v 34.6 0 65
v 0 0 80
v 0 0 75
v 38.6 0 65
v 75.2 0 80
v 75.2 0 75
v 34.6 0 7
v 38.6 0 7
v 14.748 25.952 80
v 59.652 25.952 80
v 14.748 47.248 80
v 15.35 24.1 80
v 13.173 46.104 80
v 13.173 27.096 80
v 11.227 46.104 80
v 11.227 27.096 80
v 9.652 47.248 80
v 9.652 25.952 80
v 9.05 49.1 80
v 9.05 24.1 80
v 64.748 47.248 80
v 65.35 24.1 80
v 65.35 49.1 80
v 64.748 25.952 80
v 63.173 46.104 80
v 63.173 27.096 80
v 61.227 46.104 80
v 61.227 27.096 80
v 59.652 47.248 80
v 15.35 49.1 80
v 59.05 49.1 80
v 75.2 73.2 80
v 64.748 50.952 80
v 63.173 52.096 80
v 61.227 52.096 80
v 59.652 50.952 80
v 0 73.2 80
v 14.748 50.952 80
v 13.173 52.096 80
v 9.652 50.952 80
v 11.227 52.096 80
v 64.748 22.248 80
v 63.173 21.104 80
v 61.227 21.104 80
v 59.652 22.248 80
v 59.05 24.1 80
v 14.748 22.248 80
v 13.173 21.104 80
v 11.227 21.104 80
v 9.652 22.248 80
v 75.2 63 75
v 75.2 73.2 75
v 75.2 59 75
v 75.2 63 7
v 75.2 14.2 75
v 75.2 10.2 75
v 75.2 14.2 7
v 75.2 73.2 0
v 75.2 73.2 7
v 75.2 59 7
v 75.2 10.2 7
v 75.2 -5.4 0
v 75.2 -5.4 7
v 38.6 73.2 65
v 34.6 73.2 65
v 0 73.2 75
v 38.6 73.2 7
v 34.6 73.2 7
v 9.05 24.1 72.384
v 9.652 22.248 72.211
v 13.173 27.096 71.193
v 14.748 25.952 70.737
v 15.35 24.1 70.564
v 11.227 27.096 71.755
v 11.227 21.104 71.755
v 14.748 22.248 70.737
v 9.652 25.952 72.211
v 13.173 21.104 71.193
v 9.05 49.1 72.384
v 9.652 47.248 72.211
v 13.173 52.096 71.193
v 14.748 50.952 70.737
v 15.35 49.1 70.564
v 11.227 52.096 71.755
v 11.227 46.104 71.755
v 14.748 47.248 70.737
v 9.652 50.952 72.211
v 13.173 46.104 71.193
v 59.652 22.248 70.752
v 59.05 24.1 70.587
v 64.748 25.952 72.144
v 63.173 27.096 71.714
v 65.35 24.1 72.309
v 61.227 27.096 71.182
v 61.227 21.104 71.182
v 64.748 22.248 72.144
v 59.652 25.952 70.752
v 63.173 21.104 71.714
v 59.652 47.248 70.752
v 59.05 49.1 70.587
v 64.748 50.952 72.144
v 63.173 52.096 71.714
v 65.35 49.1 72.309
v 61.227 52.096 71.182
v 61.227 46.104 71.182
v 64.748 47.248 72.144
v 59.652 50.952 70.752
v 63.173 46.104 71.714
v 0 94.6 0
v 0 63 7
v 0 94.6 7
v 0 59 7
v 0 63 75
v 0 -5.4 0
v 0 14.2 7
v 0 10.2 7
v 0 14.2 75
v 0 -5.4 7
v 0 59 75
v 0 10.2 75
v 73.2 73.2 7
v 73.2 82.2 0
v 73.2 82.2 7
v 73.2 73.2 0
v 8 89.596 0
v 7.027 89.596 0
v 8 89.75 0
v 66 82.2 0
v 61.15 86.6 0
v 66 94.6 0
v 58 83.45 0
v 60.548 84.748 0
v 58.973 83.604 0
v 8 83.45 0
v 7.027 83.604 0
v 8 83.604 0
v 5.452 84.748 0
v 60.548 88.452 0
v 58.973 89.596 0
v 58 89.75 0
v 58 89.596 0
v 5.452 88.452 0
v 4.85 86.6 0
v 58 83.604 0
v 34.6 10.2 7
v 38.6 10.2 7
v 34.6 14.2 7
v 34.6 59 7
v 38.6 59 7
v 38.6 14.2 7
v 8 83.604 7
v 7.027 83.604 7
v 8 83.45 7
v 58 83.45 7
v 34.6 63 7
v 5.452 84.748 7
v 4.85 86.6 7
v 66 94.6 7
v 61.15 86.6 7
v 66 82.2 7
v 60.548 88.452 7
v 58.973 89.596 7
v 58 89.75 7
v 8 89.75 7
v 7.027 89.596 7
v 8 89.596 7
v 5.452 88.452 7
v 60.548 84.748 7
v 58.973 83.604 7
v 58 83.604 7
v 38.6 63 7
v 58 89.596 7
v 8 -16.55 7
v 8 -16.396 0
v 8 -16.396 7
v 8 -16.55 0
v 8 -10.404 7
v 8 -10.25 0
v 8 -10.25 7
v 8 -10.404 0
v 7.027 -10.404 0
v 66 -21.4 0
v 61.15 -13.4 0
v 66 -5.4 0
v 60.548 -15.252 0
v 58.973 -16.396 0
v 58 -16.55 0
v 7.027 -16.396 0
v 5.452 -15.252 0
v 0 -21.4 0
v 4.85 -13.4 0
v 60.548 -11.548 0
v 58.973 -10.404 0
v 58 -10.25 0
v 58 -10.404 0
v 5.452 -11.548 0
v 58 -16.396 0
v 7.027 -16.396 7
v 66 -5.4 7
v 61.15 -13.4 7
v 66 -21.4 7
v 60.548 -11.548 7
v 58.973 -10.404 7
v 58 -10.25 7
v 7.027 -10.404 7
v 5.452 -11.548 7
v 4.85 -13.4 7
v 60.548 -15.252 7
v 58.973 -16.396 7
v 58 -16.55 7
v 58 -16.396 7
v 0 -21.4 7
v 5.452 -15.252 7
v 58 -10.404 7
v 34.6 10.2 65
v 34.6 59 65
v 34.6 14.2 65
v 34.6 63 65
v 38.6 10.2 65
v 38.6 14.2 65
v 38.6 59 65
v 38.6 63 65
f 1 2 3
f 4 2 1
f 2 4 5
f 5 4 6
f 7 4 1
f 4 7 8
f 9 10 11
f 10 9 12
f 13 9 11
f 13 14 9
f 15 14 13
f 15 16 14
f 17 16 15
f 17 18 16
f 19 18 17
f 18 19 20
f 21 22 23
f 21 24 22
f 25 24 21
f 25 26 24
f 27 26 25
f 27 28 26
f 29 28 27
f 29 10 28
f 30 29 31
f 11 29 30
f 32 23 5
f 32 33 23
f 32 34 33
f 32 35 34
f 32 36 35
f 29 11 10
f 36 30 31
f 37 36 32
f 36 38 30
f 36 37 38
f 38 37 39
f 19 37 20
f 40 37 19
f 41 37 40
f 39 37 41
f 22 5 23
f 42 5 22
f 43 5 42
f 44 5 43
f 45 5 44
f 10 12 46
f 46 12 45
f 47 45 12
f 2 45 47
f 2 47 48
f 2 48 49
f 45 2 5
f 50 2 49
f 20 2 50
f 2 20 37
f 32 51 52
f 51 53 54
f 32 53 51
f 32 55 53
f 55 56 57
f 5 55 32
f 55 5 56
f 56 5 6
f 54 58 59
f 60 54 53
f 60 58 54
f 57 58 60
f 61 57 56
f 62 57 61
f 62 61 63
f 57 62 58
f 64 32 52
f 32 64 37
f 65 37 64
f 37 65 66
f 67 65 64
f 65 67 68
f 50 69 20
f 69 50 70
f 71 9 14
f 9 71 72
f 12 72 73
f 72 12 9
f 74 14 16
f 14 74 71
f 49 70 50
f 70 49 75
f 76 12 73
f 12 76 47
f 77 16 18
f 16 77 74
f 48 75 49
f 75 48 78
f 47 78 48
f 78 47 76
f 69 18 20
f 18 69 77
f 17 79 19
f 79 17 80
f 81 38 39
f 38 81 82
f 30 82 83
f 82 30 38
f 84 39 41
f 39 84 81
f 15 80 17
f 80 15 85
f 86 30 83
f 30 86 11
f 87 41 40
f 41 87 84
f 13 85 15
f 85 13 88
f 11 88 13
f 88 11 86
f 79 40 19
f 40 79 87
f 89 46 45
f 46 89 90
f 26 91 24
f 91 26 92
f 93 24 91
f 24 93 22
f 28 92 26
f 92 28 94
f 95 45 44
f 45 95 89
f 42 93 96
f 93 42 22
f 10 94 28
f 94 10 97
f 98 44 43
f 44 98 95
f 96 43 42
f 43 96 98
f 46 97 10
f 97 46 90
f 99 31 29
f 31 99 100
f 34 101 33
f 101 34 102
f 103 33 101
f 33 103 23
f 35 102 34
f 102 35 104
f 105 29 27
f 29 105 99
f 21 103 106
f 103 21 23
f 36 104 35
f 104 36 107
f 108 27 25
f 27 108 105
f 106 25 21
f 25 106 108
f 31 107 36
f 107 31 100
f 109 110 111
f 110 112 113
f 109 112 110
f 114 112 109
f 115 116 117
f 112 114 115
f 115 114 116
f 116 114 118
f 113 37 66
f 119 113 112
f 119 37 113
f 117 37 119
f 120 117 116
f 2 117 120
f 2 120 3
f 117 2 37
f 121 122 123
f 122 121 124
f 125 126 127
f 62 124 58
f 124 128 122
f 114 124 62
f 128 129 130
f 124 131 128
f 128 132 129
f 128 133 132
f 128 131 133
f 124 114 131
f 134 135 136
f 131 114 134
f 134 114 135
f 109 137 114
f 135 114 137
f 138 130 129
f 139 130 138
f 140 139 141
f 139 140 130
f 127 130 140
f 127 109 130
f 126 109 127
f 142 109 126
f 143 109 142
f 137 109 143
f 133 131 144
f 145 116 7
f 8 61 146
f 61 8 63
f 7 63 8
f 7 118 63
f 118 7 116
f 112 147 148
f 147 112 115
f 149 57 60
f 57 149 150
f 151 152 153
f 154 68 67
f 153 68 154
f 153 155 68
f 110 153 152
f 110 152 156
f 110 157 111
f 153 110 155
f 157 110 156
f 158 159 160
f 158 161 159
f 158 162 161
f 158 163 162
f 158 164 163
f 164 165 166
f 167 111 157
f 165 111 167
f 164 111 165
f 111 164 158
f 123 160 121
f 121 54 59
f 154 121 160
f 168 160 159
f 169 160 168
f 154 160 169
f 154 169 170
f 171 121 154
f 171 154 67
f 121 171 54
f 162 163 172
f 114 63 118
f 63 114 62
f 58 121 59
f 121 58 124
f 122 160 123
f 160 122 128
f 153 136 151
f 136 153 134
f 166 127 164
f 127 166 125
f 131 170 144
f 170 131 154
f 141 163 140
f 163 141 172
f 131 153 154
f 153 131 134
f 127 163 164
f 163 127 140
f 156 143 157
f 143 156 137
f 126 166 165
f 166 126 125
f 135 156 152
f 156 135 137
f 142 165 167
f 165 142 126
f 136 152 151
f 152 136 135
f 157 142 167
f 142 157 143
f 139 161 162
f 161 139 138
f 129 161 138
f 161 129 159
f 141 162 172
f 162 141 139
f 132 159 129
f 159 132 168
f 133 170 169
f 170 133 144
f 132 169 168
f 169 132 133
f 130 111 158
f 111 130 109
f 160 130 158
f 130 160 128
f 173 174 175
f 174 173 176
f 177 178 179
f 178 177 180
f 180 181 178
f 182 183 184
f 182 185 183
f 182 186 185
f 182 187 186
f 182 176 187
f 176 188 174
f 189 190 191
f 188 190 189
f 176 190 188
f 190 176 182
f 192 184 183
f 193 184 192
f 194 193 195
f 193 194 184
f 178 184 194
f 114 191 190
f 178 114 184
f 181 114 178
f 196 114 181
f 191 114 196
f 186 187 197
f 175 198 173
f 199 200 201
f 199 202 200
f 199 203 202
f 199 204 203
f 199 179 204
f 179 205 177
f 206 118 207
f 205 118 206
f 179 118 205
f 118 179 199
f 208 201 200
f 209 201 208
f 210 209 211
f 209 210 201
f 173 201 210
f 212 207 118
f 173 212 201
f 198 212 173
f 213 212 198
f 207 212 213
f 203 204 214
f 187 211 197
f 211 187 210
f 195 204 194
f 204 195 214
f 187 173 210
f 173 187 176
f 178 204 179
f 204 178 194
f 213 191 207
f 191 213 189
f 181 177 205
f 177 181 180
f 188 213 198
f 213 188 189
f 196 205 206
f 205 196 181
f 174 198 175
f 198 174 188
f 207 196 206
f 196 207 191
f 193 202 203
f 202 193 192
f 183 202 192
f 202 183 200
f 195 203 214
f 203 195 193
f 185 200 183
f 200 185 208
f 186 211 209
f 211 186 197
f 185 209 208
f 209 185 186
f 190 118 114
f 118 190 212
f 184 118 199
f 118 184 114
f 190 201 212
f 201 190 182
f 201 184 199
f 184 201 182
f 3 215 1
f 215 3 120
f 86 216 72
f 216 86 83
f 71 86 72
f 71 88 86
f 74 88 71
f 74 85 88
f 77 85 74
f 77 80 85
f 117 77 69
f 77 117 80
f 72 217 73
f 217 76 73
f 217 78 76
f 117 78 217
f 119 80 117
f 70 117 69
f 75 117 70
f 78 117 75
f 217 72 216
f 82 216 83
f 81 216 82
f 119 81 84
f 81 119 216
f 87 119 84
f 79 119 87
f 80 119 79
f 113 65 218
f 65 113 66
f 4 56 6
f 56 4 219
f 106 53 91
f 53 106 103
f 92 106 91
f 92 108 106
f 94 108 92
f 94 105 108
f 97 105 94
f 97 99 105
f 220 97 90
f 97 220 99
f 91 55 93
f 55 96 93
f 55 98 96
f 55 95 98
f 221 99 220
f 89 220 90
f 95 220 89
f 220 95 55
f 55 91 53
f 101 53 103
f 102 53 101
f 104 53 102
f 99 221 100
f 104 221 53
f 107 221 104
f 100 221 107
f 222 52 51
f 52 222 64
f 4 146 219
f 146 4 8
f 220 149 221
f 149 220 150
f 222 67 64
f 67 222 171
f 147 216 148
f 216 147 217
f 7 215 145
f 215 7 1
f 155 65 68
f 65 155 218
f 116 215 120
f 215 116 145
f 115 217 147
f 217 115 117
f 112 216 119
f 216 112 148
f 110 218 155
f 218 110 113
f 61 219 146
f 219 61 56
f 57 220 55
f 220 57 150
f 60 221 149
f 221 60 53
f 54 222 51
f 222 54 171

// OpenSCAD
Beam_hight = 134; //hight of beam center
Beam_grain = 25; //align beam with center of M6 grooves
M6_groove = 6.3; //width of M6 grooves (M6 = 6mm)
M6_wall = 8; //wall for the M6 groove
M6_length = 50; //length of the M6 groove
M6_grid = 25; //distance between M6 holes

Holder_thiccness = 5; //thicness of the projector holder plate
Holder_wall = 2; //thicness of projector holder walls
Holder_wedge = 6; //wedges at the corners of the holder
Beam_side_adjust = 13; //ring outer edge to side of projector
Beam_height_adjust = 6; //ring outer edge to bottom of projector

Base_plate_higth = 7; //thicness of baseplate of projector
Support_wall = 4; //thicness of support structure
Support_heigth = 10; //heigth off angled support

Projector_width = 73.2; //long side of projector
Projector_width_thicc = 73.2; //long side at thiccer section
Projector_depth = 73.2; //short side of projector at thin section
Projector_depth_thicc = 75.2; //short side of projector at thicc section

// =====================================================
// Derived values
// =====================================================

Plate_hight = 80; //hight of plate the projecter will be resting on, beam diameter is 21mm, lens edge is at 6mm
M6_offset = 13.4; //M6 alignment distance
Plate_base = Plate_hight - Holder_thiccness;
Projecter_depth_outskirt = Projector_depth_thicc - Projector_depth; //how much the thicc section of the projector extends beyond the short section
M6_diameter = M6_groove/2; //M6 hole diameter
Base_start = M6_wall - M6_offset; // attach baseplate to m6 groove
Base_extend = 82.2; //attach baseplate to m6 groove

Support  = Support_wall / 2; //middle of support wall
Long_support = Projector_depth /2; //middle of thin long pojector side
Thicc_support = Projector_width_thicc /6; //quarter points thicc section
Thicc_support_edge = Long_support-Support+Projecter_depth_outskirt; //extention of the supports at thicc section to the end of the projector
Thin_support = (Projector_width - Projector_width_thicc) /4; //quarter points thin section
Support_angle_base = Plate_base - Support_heigth; //heigth at which angled support start

Wedge_root = sqrt(2* pow(Holder_wedge,2)); //size of cube to cut wedge


// =====================================================
// Projector holder
// =====================================================
module holder ()

{

        {
            // ---------------------------------------------
            // Projector outskirt block
            // ---------------------------------------------
            difference()
            {
            polyhedron(
                points = [
                    [Projector_depth,0,Plate_hight],    // 0
                    [Projector_depth_thicc,0,Plate_hight],    // 1
                    [Projector_depth_thicc,Projector_width_thicc,Plate_hight],  // 2
                    [Projector_depth,Projector_width_thicc,Plate_hight],  // 3
                    [Projector_depth,0,Plate_base],   // 4
                    [Projector_depth_thicc,0,Plate_base],   // 5
                    [Projector_depth_thicc,Projector_width_thicc,Plate_base], // 6
                    [Projector_depth,Projector_width_thicc,Plate_base]  // 7
                ],
                faces = [
                    [0,2,1], [0,3,2],   // bottom
                    [4,5,6], [4,6,7],   // top
                    [0,1,5], [0,5,4],   // front
                    [1,2,6], [1,6,5],   // right
                    [2,3,7], [2,7,6],   // back
                    [3,0,4], [3,4,7]    // left
                ],
                convexity = 10
            );
            
            union(){
            translate([62.2,24.1,Plate_hight])
            cylinder(10, 3.15, 3.15, center = true);
            
            translate([62.2,49.1,Plate_hight])
            cylinder(10, 3.15, 3.15, center = true);
            }
        }

            // ---------------------------------------------
            // Projector long block
            // ---------------------------------------------
                        difference()
            {
        
        polyhedron(
                points = [
                    [0,0,Plate_hight],    // 0
                    [Projector_depth,0,Plate_hight],    // 1
                    [Projector_depth,Projector_width,Plate_hight],  // 2
                    [0,Projector_width,Plate_hight],  // 3
                    [0,0,Plate_base],   // 4
                    [Projector_depth,0,Plate_base],   // 5
                    [Projector_depth,Projector_width,Plate_base], // 6
                    [0,Projector_width,Plate_base]  // 7
                ],
                faces = [
                    [0,2,1], [0,3,2],   // bottom
                    [4,5,6], [4,6,7],   // top
                    [0,1,5], [0,5,4],   // front
                    [1,2,6], [1,6,5],   // right
                    [2,3,7], [2,7,6],   // back
                    [3,0,4], [3,4,7]    // left
                ],
                convexity = 10
            );
            
                        union(){
            translate([12.2,24.1,Plate_hight])
            cylinder(10, 3.15, 3.15, center = true);
            
            translate([12.2,49.1,Plate_hight])
            cylinder(10, 3.15, 3.15, center = true);
                                       
            translate([62.2,24.1,Plate_hight])
            cylinder(10, 3.15, 3.15, center = true);
            
            translate([62.2,49.1,Plate_hight])
            cylinder(10, 3.15, 3.15, center = true);        
            }
       
        }
     
        }

}

holder ();

// =====================================================
// Base plate
// =====================================================
module base ()

{

        {
            // ---------------------------------------------
            // Projector outskirt block
            // ---------------------------------------------
            polyhedron(
                points = [
                    [Projector_depth,Base_start,Base_plate_higth],    // 0
                    [Projector_depth_thicc,Base_start,Base_plate_higth],    // 1
                    [Projector_depth_thicc,Projector_width_thicc,Base_plate_higth],  // 2
                    [Projector_depth,Projector_width_thicc,Base_plate_higth],  // 3
                    [Projector_depth,Base_start,0],   // 4
                    [Projector_depth_thicc,Base_start,0],   // 5
                    [Projector_depth_thicc,Projector_width_thicc,0], // 6
                    [Projector_depth,Projector_width_thicc,0]  // 7
                ],
                faces = [
                    [0,2,1], [0,3,2],   // bottom
                    [4,5,6], [4,6,7],   // top
                    [0,1,5], [0,5,4],   // front
                    [1,2,6], [1,6,5],   // right
                    [2,3,7], [2,7,6],   // back
                    [3,0,4], [3,4,7]    // left
                ],
                convexity = 10
            );

            // ---------------------------------------------
            // Projector long block
            // ---------------------------------------------
            polyhedron(
                points = [
                    [0,Base_start,Base_plate_higth],    // 0
                    [Projector_depth,Base_start,Base_plate_higth],    // 1
                    [Projector_depth,Base_extend,Base_plate_higth],  // 2
                    [0,Base_extend,Base_plate_higth],  // 3
                    [0,Base_start,0],   // 4
                    [Projector_depth,Base_start,0],   // 5
                    [Projector_depth,Base_extend,0], // 6
                    [0,Base_extend,0]  // 7
                ],
                faces = [
                    [0,2,1], [0,3,2],   // bottom
                    [4,5,6], [4,6,7],   // top
                    [0,1,5], [0,5,4],   // front
                    [1,2,6], [1,6,5],   // right
                    [2,3,7], [2,7,6],   // back
                    [3,0,4], [3,4,7]    // left
                ],
                convexity = 10
            );

        }

}

base ();


// =====================================================
// M6 grooves
// =====================================================
module M6 ()

        // ---------------------------------------------
        // Left block
        // ---------------------------------------------
translate([0,-M6_offset,0]){
    difference()
    {
        // ---------------------------------------------
        // Left block
        // ---------------------------------------------
        polyhedron(
                points = [
                    [0,-M6_wall,Base_plate_higth],    // 0
                    [(2*M6_wall) + M6_length,-M6_wall,Base_plate_higth],    // 1
                    [(2*M6_wall) + M6_length,M6_wall,Base_plate_higth],  // 2
                    [0,M6_wall,Base_plate_higth],  // 3
                    [0,-M6_wall,0],   // 4
                    [(2*M6_wall) + M6_length,-M6_wall,0],   // 5
                    [(2*M6_wall) + M6_length,M6_wall,0], // 6
                    [0,M6_wall,0]  // 7
                ],
                faces = [
                    [0,2,1], [0,3,2],   // bottom
                    [4,5,6], [4,6,7],   // top
                    [0,1,5], [0,5,4],   // front
                    [1,2,6], [1,6,5],   // right
                    [2,3,7], [2,7,6],   // back
                    [3,0,4], [3,4,7]    // left
                ],
                convexity = 10
            );
        
        union()
        {
            // ---------------------------------------------
            // M6 groove
            // ---------------------------------------------
            polyhedron(
                points = [
                    [M6_wall,-M6_diameter,Base_plate_higth],    // 0
                    [M6_wall + M6_length,-M6_diameter,Base_plate_higth],    // 1
                    [M6_wall + M6_length,M6_diameter,Base_plate_higth],  // 2
                    [M6_wall,M6_diameter,Base_plate_higth],  // 3
                    [M6_wall,-M6_diameter,0],   // 4
                    [M6_wall + M6_length,-M6_diameter,0],   // 5
                    [M6_wall + M6_length,M6_diameter,0], // 6
                    [M6_wall,M6_diameter,0]  // 7
                ],
                faces = [
                    [0,2,1], [0,3,2],   // bottom
                    [4,5,6], [4,6,7],   // top
                    [0,1,5], [0,5,4],   // front
                    [1,2,6], [1,6,5],   // right
                    [2,3,7], [2,7,6],   // back
                    [3,0,4], [3,4,7]    // left
                ],
                convexity = 10
            );

            // ---------------------------------------------
            // Front curve
            // ---------------------------------------------
            translate([M6_wall,0,0]){
            cylinder(Base_plate_higth,M6_diameter,M6_diameter);
            }
            // ---------------------------------------------
            // Rear curve
            // ---------------------------------------------
            translate([M6_wall + M6_length,0,0]){
            cylinder(Base_plate_higth,M6_diameter,M6_diameter);
            }
        }


    }
}

translate([0,-M6_offset + (4 * M6_grid),0]){
    difference()
    {
        // ---------------------------------------------
        // Left block
        // ---------------------------------------------
        polyhedron(
                points = [
                    [0,-M6_wall,Base_plate_higth],    // 0
                    [(2*M6_wall) + M6_length,-M6_wall,Base_plate_higth],    // 1
                    [(2*M6_wall) + M6_length,M6_wall,Base_plate_higth],  // 2
                    [0,M6_wall,Base_plate_higth],  // 3
                    [0,-M6_wall,0],   // 4
                    [(2*M6_wall) + M6_length,-M6_wall,0],   // 5
                    [(2*M6_wall) + M6_length,M6_wall,0], // 6
                    [0,M6_wall,0]  // 7
                ],
                faces = [
                    [0,2,1], [0,3,2],   // bottom
                    [4,5,6], [4,6,7],   // top
                    [0,1,5], [0,5,4],   // front
                    [1,2,6], [1,6,5],   // right
                    [2,3,7], [2,7,6],   // back
                    [3,0,4], [3,4,7]    // left
                ],
                convexity = 10
            );
        
        union()
        {
            // ---------------------------------------------
            // M6 groove
            // ---------------------------------------------
            polyhedron(
                points = [
                    [M6_wall,-M6_diameter,Base_plate_higth],    // 0
                    [M6_wall + M6_length,-M6_diameter,Base_plate_higth],    // 1
                    [M6_wall + M6_length,M6_diameter,Base_plate_higth],  // 2
                    [M6_wall,M6_diameter,Base_plate_higth],  // 3
                    [M6_wall,-M6_diameter,0],   // 4
                    [M6_wall + M6_length,-M6_diameter,0],   // 5
                    [M6_wall + M6_length,M6_diameter,0], // 6
                    [M6_wall,M6_diameter,0]  // 7
                ],
                faces = [
                    [0,2,1], [0,3,2],   // bottom
                    [4,5,6], [4,6,7],   // top
                    [0,1,5], [0,5,4],   // front
                    [1,2,6], [1,6,5],   // right
                    [2,3,7], [2,7,6],   // back
                    [3,0,4], [3,4,7]    // left
                ],
                convexity = 10
            );

            // ---------------------------------------------
            // Front curve
            // ---------------------------------------------
            translate([M6_wall,0,0]){
            cylinder(Base_plate_higth,M6_diameter,M6_diameter);
            }
            // ---------------------------------------------
            // Rear curve
            // ---------------------------------------------
            translate([M6_wall + M6_length,0,0]){
            cylinder(Base_plate_higth,M6_diameter,M6_diameter);
            }
        }


    }
}

M6 ();

// =====================================================
// Supports
// =====================================================
module support ()

{

        {
            // ---------------------------------------------
            // long support
            // ---------------------------------------------
            polyhedron(
                points = [
                    [Long_support-Support,0,Base_plate_higth],    // 0
                    [Long_support+Support,0,Base_plate_higth],    // 1
                    [Long_support+Support,Projector_width,Base_plate_higth],  // 2
                    [Long_support-Support,Projector_width,Base_plate_higth],  // 3
                    [Long_support-Support,0,Plate_base],   // 4
                    [Long_support+Support,0,Plate_base],   // 5
                    [Long_support+Support,Projector_width,Plate_base], // 6
                    [Long_support-Support,Projector_width,Plate_base]  // 7
                ],
                faces = [
                    [0,2,1], [0,3,2],   // bottom
                    [4,5,6], [4,6,7],   // top
                    [0,1,5], [0,5,4],   // front
                    [1,2,6], [1,6,5],   // right
                    [2,3,7], [2,7,6],   // back
                    [3,0,4], [3,4,7]    // left
                ],
                convexity = 10
            );



            // ---------------------------------------------
            // Thicc supports
            // ---------------------------------------------
            polyhedron(
                points = [
                    [0,Thicc_support-Support,Base_plate_higth],    // 0
                    [Long_support-Support,Thicc_support-Support,Base_plate_higth],    // 1
                    [Long_support-Support,Thicc_support+Support,Base_plate_higth],  // 2
                    [0,Thicc_support+Support,Base_plate_higth],  // 3
                    [0,Thicc_support-Support,Plate_base],   // 4
                    [Long_support-Support,Thicc_support-Support,Plate_base],   // 5
                    [Long_support-Support,Thicc_support+Support,Plate_base], // 6
                    [0,Thicc_support+Support,Plate_base]  // 7
                ],
                faces = [
                    [0,2,1], [0,3,2],   // bottom
                    [4,5,6], [4,6,7],   // top
                    [0,1,5], [0,5,4],   // front
                    [1,2,6], [1,6,5],   // right
                    [2,3,7], [2,7,6],   // back
                    [3,0,4], [3,4,7]    // left
                ],
                convexity = 10
            );
            
            
            translate([0,4*Thicc_support,0])
            polyhedron(
                points = [
                    [0,Thicc_support-Support,Base_plate_higth],    // 0
                    [Long_support-Support,Thicc_support-Support,Base_plate_higth],    // 1
                    [Long_support-Support,Thicc_support+Support,Base_plate_higth],  // 2
                    [0,Thicc_support+Support,Base_plate_higth],  // 3
                    [0,Thicc_support-Support,Plate_base],   // 4
                    [Long_support-Support,Thicc_support-Support,Plate_base],   // 5
                    [Long_support-Support,Thicc_support+Support,Plate_base], // 6
                    [0,Thicc_support+Support,Plate_base]  // 7
                ],
                faces = [
                    [0,2,1], [0,3,2],   // bottom
                    [4,5,6], [4,6,7],   // top
                    [0,1,5], [0,5,4],   // front
                    [1,2,6], [1,6,5],   // right
                    [2,3,7], [2,7,6],   // back
                    [3,0,4], [3,4,7]    // left
                ],
                convexity = 10
            );

            translate([Long_support+Support,0,0])
            polyhedron(
                points = [
                    [0,Thicc_support-Support,Base_plate_higth],    // 0
                    [Thicc_support_edge,Thicc_support-Support,Base_plate_higth],    // 1
                    [Thicc_support_edge,Thicc_support+Support,Base_plate_higth],  // 2
                    [0,Thicc_support+Support,Base_plate_higth],  // 3
                    [0,Thicc_support-Support,Plate_base],   // 4
                    [Thicc_support_edge,Thicc_support-Support,Plate_base],   // 5
                    [Thicc_support_edge,Thicc_support+Support,Plate_base], // 6
                    [0,Thicc_support+Support,Plate_base]  // 7
                ],
                faces = [
                    [0,2,1], [0,3,2],   // bottom
                    [4,5,6], [4,6,7],   // top
                    [0,1,5], [0,5,4],   // front
                    [1,2,6], [1,6,5],   // right
                    [2,3,7], [2,7,6],   // back
                    [3,0,4], [3,4,7]    // left
                ],
                convexity = 10
            );
            
            
            translate([Long_support+Support,4*Thicc_support,0])
            polyhedron(
                points = [
                    [0,Thicc_support-Support,Base_plate_higth],    // 0
                    [Thicc_support_edge,Thicc_support-Support,Base_plate_higth],    // 1
                    [Thicc_support_edge,Thicc_support+Support,Base_plate_higth],  // 2
                    [0,Thicc_support+Support,Base_plate_higth],  // 3
                    [0,Thicc_support-Support,Plate_base],   // 4
                    [Thicc_support_edge,Thicc_support-Support,Plate_base],   // 5
                    [Thicc_support_edge,Thicc_support+Support,Plate_base], // 6
                    [0,Thicc_support+Support,Plate_base]  // 7
                ],
                faces = [
                    [0,2,1], [0,3,2],   // bottom
                    [4,5,6], [4,6,7],   // top
                    [0,1,5], [0,5,4],   // front
                    [1,2,6], [1,6,5],   // right
                    [2,3,7], [2,7,6],   // back
                    [3,0,4], [3,4,7]    // left
                ],
                convexity = 10
            );

            // ---------------------------------------------
            // angled supports
            // ---------------------------------------------
difference(){
    
    union(){
            polyhedron(
                points = [
                    [Long_support-Support,Projector_width_thicc,Support_angle_base],    // 0
                    [Long_support+Support,Projector_width_thicc,Support_angle_base],    // 1
                    [Long_support+Support,Projector_width,Support_angle_base],  // 2
                    [Long_support-Support,Projector_width,Support_angle_base],  // 3
                    [0,Projector_width_thicc,Plate_base],   // 4
                    [Projector_depth,Projector_width_thicc,Plate_base],   // 5
                    [Projector_depth,Projector_width,Plate_base], // 6
                    [0,Projector_width,Plate_base]  // 7
                ],
                faces = [
                    [0,2,1], [0,3,2],   // bottom
                    [4,5,6], [4,6,7],   // top
                    [0,1,5], [0,5,4],   // front
                    [1,2,6], [1,6,5],   // right
                    [2,3,7], [2,7,6],   // back
                    [3,0,4], [3,4,7]    // left
                ],
                convexity = 10
            );
            
            polyhedron(
                points = [
                    [Long_support-Support,Projector_width_thicc,Support_angle_base],    // 0
                    [Long_support+Support,Projector_width_thicc,Support_angle_base],    // 1
                    [Long_support+Support,0,Support_angle_base],  // 2
                    [Long_support-Support,0,Support_angle_base],  // 3
                    [0,Projector_width_thicc,Plate_base],   // 4
                    [Projector_depth_thicc,Projector_width_thicc,Plate_base],   // 5
                    [Projector_depth_thicc,0,Plate_base], // 6
                    [0,0,Plate_base]  // 7
                ],
                faces = [
                    [0,2,1], [0,3,2],   // bottom
                    [4,5,6], [4,6,7],   // top
                    [0,1,5], [0,5,4],   // front
                    [1,2,6], [1,6,5],   // right
                    [2,3,7], [2,7,6],   // back
                    [3,0,4], [3,4,7]    // left
                ],
                convexity = 10
            );
            
        }
            
                                   union(){
            translate([12.2,24.1,Plate_hight])
            cylinder(30, 3.15, 3.15, center = true);
            
            translate([12.2,49.1,Plate_hight])
            cylinder(30, 3.15, 3.15, center = true);
                                       
            translate([62.2,24.1,Plate_hight])
            cylinder(30, 3.15, 3.15, center = true);
            
            translate([62.2,49.1,Plate_hight])
            cylinder(30, 3.15, 3.15, center = true);        
            }

        }
    }

}

support ();
